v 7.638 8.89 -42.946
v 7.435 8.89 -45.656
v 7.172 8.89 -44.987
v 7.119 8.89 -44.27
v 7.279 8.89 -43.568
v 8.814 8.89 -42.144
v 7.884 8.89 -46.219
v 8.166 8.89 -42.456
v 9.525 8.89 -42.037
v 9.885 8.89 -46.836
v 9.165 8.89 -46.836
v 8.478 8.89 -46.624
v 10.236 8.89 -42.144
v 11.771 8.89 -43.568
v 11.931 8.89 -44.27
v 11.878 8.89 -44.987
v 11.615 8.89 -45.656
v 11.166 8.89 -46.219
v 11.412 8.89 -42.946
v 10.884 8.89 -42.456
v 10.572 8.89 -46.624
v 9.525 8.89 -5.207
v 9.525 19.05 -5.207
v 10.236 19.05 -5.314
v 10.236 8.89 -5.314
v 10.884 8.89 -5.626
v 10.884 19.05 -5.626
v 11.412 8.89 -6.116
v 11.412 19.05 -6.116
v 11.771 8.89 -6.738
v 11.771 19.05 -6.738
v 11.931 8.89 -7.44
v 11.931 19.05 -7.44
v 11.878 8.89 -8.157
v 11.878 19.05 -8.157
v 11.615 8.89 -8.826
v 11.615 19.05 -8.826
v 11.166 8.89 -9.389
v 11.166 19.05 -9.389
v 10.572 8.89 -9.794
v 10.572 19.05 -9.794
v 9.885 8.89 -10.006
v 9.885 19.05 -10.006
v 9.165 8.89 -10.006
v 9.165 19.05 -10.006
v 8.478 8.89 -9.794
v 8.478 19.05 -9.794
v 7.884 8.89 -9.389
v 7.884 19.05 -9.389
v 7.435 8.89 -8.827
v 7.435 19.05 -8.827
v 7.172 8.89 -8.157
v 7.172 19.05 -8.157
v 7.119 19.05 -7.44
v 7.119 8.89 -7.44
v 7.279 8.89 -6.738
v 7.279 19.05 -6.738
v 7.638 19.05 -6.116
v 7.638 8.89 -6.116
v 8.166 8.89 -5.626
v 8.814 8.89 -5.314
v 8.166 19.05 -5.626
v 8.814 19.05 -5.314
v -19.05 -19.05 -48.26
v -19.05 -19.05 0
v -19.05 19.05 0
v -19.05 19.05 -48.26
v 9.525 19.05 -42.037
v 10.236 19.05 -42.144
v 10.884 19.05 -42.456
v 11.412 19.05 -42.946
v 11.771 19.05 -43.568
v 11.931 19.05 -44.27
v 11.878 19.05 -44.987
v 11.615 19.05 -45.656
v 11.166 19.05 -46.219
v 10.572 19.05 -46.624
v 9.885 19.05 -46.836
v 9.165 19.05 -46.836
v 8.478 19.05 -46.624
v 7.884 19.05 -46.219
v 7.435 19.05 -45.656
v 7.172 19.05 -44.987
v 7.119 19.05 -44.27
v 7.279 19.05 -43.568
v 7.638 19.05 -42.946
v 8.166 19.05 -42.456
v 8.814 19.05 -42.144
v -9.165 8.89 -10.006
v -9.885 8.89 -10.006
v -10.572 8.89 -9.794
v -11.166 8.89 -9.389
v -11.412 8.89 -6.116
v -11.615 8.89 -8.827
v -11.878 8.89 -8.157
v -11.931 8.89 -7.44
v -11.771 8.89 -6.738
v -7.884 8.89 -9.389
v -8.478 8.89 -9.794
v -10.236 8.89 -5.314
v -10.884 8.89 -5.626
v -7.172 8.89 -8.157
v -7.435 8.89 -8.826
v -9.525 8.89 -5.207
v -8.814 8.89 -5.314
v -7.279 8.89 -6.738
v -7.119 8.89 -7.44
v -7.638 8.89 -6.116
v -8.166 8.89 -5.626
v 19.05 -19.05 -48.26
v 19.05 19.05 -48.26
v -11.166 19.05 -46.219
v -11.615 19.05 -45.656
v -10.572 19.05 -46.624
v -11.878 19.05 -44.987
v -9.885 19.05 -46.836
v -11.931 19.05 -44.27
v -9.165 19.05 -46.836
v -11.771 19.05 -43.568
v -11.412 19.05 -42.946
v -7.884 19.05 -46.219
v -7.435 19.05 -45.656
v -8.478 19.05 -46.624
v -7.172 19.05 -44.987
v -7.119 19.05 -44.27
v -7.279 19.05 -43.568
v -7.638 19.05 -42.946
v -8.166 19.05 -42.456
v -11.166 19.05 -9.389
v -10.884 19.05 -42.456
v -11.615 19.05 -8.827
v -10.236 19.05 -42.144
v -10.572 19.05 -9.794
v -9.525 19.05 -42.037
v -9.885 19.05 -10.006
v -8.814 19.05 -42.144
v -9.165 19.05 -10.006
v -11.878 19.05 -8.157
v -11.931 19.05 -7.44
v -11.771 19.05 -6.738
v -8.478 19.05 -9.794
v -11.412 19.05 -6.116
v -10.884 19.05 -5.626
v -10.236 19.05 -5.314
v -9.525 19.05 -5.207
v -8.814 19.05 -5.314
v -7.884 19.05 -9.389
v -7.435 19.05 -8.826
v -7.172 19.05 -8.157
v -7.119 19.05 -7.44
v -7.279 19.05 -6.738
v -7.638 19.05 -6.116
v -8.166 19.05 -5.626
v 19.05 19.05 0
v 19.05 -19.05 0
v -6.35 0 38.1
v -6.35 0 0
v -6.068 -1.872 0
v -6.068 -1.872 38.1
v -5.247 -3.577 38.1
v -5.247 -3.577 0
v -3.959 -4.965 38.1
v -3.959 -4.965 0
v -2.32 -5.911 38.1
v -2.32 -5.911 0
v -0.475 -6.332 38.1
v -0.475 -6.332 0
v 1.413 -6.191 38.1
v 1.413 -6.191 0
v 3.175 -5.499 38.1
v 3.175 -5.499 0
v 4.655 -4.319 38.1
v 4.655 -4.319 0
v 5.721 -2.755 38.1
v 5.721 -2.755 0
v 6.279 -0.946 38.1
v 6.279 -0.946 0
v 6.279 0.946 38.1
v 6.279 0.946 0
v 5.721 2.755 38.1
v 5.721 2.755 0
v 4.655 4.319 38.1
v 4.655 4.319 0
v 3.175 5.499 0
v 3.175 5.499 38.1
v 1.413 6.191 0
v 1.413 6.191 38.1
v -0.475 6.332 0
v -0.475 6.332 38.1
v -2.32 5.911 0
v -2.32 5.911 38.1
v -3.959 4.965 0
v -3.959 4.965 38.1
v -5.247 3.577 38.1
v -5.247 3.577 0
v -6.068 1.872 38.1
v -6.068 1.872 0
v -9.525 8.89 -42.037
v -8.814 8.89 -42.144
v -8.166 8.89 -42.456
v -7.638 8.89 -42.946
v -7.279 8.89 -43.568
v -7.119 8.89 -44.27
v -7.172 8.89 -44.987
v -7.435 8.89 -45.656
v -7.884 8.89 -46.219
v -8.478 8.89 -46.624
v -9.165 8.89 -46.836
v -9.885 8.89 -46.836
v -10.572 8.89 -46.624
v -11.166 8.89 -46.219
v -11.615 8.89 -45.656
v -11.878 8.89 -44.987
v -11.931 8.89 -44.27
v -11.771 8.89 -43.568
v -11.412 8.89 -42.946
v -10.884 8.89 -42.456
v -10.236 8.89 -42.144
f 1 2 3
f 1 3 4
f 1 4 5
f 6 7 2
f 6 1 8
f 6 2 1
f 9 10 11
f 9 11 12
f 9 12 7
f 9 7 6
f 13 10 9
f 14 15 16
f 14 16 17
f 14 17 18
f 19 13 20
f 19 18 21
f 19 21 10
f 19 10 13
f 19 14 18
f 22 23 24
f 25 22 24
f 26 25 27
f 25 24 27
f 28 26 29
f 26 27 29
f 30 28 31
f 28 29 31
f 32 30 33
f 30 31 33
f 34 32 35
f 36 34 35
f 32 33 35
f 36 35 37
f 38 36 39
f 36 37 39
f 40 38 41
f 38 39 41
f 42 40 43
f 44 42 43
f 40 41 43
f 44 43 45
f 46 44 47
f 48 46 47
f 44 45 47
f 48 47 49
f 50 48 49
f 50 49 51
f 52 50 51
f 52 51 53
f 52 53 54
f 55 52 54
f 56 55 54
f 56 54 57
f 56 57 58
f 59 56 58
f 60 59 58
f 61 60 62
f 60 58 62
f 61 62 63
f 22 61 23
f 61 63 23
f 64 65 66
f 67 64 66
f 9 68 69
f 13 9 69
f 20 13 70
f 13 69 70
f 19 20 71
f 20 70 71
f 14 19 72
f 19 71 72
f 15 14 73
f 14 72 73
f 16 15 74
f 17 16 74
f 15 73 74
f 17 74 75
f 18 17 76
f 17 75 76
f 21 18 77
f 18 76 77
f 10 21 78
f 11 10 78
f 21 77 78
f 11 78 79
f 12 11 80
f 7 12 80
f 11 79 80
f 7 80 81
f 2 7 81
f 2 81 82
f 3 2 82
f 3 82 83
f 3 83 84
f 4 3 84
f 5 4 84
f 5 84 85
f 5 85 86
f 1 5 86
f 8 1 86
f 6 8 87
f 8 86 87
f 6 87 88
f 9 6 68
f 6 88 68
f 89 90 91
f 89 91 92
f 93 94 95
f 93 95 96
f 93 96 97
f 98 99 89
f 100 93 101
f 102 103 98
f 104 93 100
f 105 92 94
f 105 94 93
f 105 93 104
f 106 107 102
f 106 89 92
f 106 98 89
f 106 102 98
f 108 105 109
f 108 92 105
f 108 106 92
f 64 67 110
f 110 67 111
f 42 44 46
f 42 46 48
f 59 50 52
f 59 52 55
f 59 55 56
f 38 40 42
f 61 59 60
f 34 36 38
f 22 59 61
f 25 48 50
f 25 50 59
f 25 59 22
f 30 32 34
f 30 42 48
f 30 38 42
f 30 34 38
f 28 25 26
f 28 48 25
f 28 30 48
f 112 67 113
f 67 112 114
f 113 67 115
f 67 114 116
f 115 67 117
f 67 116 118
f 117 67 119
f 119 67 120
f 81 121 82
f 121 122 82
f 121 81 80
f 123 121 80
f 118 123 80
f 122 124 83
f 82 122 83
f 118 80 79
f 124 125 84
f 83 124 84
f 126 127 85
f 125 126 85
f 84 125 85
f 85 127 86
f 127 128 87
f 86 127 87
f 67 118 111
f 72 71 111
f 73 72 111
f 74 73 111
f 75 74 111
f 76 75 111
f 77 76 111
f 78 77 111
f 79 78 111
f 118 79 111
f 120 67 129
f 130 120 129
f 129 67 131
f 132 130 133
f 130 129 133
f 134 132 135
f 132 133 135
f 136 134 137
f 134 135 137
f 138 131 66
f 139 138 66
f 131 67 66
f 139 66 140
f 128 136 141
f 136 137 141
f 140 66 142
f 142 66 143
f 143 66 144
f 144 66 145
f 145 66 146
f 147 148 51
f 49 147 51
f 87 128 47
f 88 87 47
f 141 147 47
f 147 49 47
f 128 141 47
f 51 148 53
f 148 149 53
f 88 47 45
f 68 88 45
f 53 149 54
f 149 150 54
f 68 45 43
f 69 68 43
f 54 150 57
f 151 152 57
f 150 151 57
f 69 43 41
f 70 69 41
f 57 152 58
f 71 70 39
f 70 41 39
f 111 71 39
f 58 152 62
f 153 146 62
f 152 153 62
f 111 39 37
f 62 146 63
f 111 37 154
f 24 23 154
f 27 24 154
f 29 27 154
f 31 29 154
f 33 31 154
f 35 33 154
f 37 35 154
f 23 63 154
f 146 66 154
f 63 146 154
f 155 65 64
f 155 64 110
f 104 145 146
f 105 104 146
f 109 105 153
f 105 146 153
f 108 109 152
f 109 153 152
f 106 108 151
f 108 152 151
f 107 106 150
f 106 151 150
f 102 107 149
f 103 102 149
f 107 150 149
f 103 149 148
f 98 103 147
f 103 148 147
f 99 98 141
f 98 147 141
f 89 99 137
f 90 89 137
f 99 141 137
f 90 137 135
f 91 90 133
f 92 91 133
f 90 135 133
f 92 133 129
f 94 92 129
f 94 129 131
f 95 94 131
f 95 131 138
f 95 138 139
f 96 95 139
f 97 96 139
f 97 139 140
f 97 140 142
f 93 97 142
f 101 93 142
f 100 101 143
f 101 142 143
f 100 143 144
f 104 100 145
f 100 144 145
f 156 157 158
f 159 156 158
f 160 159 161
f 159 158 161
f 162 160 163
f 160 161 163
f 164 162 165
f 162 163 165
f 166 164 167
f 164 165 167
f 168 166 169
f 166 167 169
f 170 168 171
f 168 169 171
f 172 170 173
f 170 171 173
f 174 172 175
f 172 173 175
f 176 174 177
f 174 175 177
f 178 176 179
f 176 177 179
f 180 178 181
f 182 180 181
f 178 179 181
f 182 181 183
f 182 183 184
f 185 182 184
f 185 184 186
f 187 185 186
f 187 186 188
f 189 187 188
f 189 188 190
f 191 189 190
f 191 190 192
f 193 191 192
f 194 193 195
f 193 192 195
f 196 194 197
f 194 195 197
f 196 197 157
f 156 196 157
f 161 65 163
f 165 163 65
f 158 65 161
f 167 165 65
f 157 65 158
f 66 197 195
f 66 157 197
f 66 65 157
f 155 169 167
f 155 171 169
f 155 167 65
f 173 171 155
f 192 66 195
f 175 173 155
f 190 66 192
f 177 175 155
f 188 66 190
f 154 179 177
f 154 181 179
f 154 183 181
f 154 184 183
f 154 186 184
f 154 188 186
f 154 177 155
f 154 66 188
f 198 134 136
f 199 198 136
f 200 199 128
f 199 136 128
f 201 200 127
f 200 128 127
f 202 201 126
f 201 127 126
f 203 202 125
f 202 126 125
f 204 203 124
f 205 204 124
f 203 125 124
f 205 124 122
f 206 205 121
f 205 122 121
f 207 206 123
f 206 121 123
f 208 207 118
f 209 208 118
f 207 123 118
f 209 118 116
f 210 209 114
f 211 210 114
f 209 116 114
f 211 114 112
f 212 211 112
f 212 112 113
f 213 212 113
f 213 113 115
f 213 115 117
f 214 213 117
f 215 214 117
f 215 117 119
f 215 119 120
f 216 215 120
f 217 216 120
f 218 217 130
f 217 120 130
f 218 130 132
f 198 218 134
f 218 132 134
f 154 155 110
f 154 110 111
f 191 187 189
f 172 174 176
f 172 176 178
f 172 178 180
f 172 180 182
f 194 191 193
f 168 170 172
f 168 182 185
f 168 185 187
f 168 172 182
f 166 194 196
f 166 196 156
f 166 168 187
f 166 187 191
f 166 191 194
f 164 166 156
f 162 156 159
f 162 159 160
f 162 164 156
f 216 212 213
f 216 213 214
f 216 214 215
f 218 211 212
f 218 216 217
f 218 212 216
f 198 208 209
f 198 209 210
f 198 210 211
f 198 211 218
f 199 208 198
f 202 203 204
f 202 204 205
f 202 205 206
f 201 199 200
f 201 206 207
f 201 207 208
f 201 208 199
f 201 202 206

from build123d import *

# Parameters (mm, degrees)
SKETCH3_W           = 38.1
SKETCH3_H           = 38.1
BOSS_EXTRUDE1_DEPTH = 48.26
SKETCH4_R           = 6.35
BOSS_EXTRUDE2_DEPTH = 38.1
SKETCH5_R           = 2.413
CUT_EXTRUDE1_DEPTH  = 10.16


with BuildPart() as part:
    # Sketch3 → Boss-Extrude1 (new body)
    with BuildSketch(Plane.XY):
        Rectangle(SKETCH3_W, SKETCH3_H)
    extrude(amount=-BOSS_EXTRUDE1_DEPTH)

    # Sketch4 → Boss-Extrude2 (add)
    with BuildSketch(Plane.XY):
        with Locations(Location((0, 0, 0), (0, 0, 180))):
            Circle(SKETCH4_R)
    extrude(amount=BOSS_EXTRUDE2_DEPTH)

    # Sketch5 → Cut-Extrude1 (cut)
    with BuildSketch(Plane(origin=(0, 19.05, 0), x_dir=(1, 0, 0), z_dir=(0, 1, 0))):
        with Locations(Location((-9.525, 44.45, 0), (0, 0, 270))):
            Circle(SKETCH5_R)
        with Locations(Location((9.525, 44.45, 0), (0, 0, 270))):
            Circle(SKETCH5_R)
        with Locations(Location((9.525, 7.62, 0), (0, 0, 270))):
            Circle(SKETCH5_R)
        with Locations(Location((-9.525, 7.62, 0), (0, 0, 270))):
            Circle(SKETCH5_R)
    extrude(amount=-CUT_EXTRUDE1_DEPTH, mode=Mode.SUBTRACT)


solid = part.part
